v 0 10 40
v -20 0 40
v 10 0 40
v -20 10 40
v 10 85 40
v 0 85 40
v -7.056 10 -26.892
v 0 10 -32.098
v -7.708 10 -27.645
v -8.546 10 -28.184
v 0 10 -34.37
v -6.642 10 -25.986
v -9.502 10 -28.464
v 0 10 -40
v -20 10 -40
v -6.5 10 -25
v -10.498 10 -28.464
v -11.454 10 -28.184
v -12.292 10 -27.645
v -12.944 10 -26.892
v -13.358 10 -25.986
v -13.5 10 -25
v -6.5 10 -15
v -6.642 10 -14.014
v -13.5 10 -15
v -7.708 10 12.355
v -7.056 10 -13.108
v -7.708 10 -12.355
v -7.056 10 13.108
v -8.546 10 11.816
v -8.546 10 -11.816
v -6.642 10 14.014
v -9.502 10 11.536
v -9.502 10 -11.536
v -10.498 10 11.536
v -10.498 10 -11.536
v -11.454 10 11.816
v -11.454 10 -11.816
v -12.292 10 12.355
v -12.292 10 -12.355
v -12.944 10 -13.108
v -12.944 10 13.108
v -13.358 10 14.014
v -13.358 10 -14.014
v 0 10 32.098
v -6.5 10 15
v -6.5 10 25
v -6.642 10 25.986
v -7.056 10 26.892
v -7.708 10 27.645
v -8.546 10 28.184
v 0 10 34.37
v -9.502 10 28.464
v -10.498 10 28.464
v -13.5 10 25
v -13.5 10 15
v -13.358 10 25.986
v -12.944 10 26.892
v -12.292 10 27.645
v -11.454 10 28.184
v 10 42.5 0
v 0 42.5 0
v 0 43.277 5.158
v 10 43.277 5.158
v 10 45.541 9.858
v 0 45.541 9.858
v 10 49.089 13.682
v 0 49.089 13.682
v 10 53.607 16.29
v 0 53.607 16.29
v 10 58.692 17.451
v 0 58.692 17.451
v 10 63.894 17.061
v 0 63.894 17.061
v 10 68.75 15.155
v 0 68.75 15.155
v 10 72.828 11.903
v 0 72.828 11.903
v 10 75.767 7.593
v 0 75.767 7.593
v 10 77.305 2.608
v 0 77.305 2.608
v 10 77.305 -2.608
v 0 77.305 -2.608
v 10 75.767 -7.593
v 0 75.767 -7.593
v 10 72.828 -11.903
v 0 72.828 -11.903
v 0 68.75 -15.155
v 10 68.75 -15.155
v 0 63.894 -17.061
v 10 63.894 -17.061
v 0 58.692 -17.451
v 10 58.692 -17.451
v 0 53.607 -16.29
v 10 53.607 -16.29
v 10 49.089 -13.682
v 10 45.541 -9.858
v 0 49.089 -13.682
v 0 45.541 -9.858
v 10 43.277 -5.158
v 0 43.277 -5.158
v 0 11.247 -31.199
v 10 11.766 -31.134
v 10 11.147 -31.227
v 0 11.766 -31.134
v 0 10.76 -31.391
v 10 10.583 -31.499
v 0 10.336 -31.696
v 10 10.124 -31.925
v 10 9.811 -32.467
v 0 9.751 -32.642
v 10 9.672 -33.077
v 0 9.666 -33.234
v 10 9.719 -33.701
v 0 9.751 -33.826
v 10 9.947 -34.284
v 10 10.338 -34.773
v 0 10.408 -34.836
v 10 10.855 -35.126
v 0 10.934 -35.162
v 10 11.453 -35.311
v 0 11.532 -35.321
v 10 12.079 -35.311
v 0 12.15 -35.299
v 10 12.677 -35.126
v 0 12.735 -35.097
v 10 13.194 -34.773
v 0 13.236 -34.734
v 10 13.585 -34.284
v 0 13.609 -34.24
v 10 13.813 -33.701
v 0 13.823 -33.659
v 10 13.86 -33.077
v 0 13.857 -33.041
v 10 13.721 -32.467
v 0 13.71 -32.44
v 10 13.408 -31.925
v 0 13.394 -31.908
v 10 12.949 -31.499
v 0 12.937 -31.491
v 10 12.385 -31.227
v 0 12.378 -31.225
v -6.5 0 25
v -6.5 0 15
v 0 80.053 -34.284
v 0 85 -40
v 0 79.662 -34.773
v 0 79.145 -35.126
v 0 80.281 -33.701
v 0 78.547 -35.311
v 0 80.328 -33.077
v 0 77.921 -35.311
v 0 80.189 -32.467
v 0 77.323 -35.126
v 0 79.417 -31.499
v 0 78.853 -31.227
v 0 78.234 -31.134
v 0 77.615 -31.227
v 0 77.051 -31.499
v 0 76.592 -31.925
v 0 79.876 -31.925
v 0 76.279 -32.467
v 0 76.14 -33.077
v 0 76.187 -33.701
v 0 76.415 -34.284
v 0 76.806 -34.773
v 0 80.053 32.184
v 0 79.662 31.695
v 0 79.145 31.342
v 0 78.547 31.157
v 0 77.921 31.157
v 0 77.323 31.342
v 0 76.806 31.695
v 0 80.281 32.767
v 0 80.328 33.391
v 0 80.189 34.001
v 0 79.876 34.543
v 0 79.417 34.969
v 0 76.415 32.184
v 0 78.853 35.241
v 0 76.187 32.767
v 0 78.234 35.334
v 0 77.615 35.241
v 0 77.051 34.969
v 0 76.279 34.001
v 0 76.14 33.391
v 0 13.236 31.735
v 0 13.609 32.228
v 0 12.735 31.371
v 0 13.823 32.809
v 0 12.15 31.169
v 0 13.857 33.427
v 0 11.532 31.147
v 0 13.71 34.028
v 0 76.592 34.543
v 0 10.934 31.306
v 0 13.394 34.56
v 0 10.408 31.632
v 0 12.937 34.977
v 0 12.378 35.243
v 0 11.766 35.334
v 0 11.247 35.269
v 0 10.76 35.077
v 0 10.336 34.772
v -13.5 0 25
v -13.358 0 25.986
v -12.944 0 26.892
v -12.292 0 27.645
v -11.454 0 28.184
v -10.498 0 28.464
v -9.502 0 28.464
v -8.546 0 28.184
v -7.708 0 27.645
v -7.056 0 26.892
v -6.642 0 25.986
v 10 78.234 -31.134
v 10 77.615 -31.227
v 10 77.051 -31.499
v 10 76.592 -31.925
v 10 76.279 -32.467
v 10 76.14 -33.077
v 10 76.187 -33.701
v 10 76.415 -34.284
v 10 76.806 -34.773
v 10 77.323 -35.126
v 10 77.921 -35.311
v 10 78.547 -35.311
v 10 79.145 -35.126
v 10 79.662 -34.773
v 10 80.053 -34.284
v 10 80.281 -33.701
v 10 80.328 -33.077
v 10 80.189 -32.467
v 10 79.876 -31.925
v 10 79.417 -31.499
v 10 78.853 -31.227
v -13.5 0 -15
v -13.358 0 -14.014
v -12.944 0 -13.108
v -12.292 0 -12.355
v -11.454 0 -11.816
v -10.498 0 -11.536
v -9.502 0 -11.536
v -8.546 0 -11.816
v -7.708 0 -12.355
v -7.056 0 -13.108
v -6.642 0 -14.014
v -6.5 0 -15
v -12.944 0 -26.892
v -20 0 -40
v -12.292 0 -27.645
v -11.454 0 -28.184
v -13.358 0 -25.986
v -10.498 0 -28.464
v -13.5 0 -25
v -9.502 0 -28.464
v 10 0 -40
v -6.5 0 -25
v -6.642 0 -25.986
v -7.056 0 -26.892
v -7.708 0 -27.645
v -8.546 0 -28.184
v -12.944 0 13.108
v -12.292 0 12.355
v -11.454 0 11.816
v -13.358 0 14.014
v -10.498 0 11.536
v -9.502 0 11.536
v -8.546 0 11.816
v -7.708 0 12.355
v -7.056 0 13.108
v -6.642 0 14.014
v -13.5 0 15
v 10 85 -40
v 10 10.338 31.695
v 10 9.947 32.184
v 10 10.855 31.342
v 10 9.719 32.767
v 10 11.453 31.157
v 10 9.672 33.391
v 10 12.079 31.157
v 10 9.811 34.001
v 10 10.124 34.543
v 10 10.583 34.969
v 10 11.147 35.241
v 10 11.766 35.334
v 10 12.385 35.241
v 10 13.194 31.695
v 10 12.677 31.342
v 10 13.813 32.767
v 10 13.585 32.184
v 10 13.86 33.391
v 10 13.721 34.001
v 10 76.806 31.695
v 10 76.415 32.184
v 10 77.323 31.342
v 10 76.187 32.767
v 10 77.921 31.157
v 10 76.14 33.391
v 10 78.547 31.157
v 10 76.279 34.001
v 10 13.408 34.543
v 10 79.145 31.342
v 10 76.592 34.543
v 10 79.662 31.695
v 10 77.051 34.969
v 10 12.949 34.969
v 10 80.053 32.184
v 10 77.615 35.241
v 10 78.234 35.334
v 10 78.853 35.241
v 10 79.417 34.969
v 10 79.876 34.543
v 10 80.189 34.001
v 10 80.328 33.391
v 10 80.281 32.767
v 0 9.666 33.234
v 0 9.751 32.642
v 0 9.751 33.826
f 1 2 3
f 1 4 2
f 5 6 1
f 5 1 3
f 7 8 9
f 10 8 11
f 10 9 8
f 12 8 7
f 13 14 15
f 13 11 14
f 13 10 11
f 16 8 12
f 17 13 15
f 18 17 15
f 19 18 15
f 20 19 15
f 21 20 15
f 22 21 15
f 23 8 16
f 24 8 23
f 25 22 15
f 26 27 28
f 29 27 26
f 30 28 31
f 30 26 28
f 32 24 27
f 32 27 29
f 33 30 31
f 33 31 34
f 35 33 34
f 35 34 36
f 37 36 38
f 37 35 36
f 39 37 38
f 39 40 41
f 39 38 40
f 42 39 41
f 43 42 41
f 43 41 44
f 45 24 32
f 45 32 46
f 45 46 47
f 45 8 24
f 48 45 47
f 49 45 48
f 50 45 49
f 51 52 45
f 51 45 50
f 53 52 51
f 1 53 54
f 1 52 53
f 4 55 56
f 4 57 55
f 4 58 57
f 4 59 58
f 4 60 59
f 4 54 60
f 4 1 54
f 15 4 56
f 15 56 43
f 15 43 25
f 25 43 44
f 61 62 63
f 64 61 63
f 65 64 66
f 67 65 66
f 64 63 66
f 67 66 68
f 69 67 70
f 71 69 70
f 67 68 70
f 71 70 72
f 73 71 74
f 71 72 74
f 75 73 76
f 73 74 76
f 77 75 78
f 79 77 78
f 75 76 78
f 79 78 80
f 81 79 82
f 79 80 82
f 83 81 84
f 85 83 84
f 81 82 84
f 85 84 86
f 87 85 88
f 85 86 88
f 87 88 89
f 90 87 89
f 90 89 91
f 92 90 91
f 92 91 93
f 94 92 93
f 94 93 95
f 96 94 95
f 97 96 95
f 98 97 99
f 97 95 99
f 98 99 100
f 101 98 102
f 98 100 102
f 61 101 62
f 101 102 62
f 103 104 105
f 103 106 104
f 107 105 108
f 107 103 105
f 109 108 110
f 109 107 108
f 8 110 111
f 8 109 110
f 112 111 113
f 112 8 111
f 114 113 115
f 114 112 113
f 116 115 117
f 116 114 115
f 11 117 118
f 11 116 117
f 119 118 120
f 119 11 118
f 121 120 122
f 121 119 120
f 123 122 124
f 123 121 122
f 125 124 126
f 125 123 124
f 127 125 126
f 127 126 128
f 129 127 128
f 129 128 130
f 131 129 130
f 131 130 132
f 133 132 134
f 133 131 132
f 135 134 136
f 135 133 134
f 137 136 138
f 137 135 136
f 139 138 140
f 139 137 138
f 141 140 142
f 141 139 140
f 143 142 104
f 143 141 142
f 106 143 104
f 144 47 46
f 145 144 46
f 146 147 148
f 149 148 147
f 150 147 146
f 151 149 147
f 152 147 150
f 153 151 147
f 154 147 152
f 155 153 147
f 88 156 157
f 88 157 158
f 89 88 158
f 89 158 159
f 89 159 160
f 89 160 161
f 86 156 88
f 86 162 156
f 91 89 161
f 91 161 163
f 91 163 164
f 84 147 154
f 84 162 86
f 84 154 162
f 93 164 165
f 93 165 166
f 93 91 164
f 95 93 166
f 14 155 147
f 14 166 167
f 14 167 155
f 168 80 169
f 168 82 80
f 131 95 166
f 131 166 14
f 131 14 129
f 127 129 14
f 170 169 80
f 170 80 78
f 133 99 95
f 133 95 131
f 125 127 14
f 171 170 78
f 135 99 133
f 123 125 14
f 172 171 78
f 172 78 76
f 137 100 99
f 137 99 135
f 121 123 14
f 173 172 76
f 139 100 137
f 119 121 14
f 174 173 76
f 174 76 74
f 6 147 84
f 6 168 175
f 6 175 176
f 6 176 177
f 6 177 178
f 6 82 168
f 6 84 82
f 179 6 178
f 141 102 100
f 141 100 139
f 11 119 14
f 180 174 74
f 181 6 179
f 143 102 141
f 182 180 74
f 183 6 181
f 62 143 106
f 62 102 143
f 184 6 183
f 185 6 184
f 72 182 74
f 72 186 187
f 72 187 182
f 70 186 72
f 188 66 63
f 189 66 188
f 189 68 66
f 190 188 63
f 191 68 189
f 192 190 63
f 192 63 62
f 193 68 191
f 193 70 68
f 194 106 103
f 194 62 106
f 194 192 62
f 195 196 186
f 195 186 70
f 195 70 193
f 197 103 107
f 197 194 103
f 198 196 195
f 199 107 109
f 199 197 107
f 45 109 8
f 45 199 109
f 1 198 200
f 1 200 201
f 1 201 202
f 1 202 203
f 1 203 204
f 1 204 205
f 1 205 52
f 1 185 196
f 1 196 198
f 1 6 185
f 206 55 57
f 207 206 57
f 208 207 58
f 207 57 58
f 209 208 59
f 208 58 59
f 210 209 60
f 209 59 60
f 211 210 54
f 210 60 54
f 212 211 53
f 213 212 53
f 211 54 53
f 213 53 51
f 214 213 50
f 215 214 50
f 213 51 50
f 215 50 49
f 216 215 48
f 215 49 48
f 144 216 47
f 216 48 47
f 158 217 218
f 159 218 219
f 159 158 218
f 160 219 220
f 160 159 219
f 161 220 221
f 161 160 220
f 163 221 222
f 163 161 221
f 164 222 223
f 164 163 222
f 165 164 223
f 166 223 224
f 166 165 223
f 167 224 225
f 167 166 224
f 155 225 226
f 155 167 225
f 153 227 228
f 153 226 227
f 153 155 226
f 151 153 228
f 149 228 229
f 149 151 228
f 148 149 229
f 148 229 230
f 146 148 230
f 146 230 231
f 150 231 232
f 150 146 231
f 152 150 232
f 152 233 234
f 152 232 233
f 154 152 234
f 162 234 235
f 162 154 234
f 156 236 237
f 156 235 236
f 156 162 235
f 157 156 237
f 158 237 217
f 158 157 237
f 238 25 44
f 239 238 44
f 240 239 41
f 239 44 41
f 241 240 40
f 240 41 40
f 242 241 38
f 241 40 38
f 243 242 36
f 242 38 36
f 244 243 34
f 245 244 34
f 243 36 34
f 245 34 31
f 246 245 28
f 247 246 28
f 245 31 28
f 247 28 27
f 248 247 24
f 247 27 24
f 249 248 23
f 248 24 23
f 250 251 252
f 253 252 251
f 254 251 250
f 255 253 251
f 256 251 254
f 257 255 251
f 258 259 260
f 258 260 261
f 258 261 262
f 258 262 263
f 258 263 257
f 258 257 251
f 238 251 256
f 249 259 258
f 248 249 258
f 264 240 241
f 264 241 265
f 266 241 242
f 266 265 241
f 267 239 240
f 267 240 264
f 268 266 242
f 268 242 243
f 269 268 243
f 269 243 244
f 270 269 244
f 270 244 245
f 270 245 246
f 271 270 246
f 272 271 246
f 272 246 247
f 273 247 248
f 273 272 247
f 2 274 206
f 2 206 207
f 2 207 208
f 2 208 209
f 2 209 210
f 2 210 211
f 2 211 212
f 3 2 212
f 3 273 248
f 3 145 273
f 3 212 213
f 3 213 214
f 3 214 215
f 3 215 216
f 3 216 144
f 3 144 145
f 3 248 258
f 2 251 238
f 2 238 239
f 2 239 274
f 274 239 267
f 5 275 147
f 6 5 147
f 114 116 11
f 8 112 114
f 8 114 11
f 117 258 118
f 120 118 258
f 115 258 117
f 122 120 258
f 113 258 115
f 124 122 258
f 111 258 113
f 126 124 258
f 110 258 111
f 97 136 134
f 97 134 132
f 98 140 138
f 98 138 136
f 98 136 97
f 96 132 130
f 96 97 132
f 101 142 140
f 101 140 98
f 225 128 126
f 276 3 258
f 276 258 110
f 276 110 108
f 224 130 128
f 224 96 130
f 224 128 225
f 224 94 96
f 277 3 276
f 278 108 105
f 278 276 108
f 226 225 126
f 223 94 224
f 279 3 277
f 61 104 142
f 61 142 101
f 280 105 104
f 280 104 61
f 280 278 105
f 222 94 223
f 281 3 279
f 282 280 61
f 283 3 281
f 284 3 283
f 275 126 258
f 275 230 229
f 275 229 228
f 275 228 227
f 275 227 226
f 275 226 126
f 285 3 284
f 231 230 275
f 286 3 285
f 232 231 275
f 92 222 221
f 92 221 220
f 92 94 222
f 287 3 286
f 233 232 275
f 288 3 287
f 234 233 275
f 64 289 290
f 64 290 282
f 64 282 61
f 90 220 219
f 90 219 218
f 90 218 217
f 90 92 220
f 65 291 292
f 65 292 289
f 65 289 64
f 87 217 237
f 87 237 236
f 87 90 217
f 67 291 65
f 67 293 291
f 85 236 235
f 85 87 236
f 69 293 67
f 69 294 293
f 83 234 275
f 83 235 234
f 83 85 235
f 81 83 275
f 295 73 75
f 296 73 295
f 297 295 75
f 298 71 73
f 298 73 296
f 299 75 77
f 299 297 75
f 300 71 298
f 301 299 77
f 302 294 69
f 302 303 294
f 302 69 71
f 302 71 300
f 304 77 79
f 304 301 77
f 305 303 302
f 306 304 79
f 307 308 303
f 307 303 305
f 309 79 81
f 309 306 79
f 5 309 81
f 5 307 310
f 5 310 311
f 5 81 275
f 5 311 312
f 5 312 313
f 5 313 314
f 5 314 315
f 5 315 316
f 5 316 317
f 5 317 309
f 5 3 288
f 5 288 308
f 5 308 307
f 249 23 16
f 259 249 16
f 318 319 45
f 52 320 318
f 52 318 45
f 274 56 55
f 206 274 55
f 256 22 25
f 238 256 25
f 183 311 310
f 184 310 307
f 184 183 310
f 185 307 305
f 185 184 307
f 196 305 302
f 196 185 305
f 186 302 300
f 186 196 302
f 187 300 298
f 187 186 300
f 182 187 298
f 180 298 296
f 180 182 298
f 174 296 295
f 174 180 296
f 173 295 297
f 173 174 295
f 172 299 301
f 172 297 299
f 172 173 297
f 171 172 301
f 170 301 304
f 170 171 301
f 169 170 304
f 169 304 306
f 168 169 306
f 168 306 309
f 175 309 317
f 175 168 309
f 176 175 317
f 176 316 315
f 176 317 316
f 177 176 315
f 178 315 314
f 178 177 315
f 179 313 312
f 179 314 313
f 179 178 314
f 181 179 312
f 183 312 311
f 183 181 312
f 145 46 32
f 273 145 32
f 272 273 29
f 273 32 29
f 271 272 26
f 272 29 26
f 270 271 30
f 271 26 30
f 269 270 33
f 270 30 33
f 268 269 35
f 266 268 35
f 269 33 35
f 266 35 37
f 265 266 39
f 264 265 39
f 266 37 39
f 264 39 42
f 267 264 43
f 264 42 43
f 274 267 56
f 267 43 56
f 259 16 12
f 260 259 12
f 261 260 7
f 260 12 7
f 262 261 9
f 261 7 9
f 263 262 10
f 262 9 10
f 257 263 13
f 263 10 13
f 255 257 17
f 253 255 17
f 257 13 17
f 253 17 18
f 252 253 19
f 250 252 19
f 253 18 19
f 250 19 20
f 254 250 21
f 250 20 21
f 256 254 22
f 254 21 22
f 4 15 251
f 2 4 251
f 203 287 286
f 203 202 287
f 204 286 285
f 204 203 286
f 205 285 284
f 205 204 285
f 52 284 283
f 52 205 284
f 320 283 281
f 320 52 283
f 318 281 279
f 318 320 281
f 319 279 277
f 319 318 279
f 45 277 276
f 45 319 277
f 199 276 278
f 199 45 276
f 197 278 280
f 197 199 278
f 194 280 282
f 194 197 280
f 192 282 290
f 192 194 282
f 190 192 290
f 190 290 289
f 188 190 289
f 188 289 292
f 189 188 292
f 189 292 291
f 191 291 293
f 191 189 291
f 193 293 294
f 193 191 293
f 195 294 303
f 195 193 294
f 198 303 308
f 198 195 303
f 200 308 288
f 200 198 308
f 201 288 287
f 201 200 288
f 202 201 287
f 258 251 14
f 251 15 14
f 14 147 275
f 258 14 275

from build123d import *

# Parameters (mm, degrees)
EXTRUDE_1_DEPTH             = 40
CUT_EXTRUDE_2_REACH         = 89.321
HOLE_WIZARD_M5_1_AT_2_COUNT = 2
HOLE_WIZARD_M5_1_AT_2_PITCH = 66.468037432
HOLE_WIZARD_M5_1_AT_3_COUNT = 2
HOLE_WIZARD_M5_1_AT_3_PITCH = 94
HOLE_WIZARD_M5_1_AT_4_COUNT = 2
HOLE_WIZARD_M5_1_AT_4_PITCH = 66.468037432
SKETCH_5_R                  = 17.5
CUT_EXTRUDE_3_DEPTH         = 10


with BuildPart() as part:
    # 草图1 → 拉伸1 (new, symmetric)
    with BuildSketch(Plane.XY):
        Polygon((-20, 0), (10, 0), (10, 85), (0, 85), (0, 10), (-20, 10), align=None)
    extrude(amount=EXTRUDE_1_DEPTH, both=True)

    # 草图2 → 拉伸2 (cut, up to next)
    with BuildSketch(Plane(origin=(0, 10, 0), x_dir=(1, 0, 0), z_dir=(0, 1, 0)), mode=Mode.PRIVATE) as cut_extrude_2_sk1:
        with BuildLine():
            Line((-13.5, 25), (-13.5, 15))
            ThreePointArc((-13.5, 15), (-10, 11.5), (-6.5, 15))
            Line((-6.5, 15), (-6.5, 25))
            ThreePointArc((-6.5, 25), (-10, 28.5), (-13.5, 25))
        make_face()
    cut_extrude_2_tool1 = extrude(cut_extrude_2_sk1.sketch, amount=-CUT_EXTRUDE_2_REACH, mode=Mode.PRIVATE) & part.part
    # 草图2 → 拉伸2 (cut, up to next)
    with BuildSketch(Plane(origin=(0, 10, 0), x_dir=(1, 0, 0), z_dir=(0, 1, 0)), mode=Mode.PRIVATE) as cut_extrude_2_sk2:
        with BuildLine():
            Line((-13.5, -15), (-13.5, -25))
            ThreePointArc((-13.5, -25), (-10, -28.5), (-6.5, -25))
            Line((-6.5, -25), (-6.5, -15))
            ThreePointArc((-6.5, -15), (-10, -11.5), (-13.5, -15))
        make_face()
    cut_extrude_2_tool2 = extrude(cut_extrude_2_sk2.sketch, amount=-CUT_EXTRUDE_2_REACH, mode=Mode.PRIVATE) & part.part
    add(cut_extrude_2_tool1.solids().sort_by_distance((-10, 10, -20))[0], mode=Mode.SUBTRACT)
    add(cut_extrude_2_tool2.solids().sort_by_distance((-10, 10, 20))[0], mode=Mode.SUBTRACT)

    # 草图3 → M5 螺纹孔1 (revolve, cut)
    with BuildSketch(Plane(origin=(0, 78.234018716, 33.234018716), x_dir=(0, 0, 1), z_dir=(0, 1, 0))):
        Polygon((0, 0), (0, 15.2618073), (2.1, 14), (2.1, 0), align=None)
    hole_wizard_m5_1 = revolve(axis=Axis((-6.35, 78.234018716, 33.234018716), (1, 0, 0)), mode=Mode.SUBTRACT)

    # M5 螺纹孔1 at 2: M5 螺纹孔1 ×2
    with Locations(*[(0, 0, -i * HOLE_WIZARD_M5_1_AT_2_PITCH) for i in range(1, HOLE_WIZARD_M5_1_AT_2_COUNT)]):
        add(hole_wizard_m5_1, mode=Mode.SUBTRACT)

    # M5 螺纹孔1 at 3: M5 螺纹孔1 ×2
    with Locations(*[Vector(0, -0.7071067811865464, -0.7071067811865487) * (i * HOLE_WIZARD_M5_1_AT_3_PITCH) for i in range(1, HOLE_WIZARD_M5_1_AT_3_COUNT)]):
        add(hole_wizard_m5_1, mode=Mode.SUBTRACT)

    # M5 螺纹孔1 at 4: M5 螺纹孔1 ×2
    with Locations(*[(0, -i * HOLE_WIZARD_M5_1_AT_4_PITCH, 0) for i in range(1, HOLE_WIZARD_M5_1_AT_4_COUNT)]):
        add(hole_wizard_m5_1, mode=Mode.SUBTRACT)

    # 草图5 → 拉伸3 (cut)
    with BuildSketch(Plane.ZY):
        with Locations(Location((0, 60, 0), (0, 0, 270))):
            Circle(SKETCH_5_R)
    extrude(amount=-CUT_EXTRUDE_3_DEPTH, mode=Mode.SUBTRACT)


solid = part.part
